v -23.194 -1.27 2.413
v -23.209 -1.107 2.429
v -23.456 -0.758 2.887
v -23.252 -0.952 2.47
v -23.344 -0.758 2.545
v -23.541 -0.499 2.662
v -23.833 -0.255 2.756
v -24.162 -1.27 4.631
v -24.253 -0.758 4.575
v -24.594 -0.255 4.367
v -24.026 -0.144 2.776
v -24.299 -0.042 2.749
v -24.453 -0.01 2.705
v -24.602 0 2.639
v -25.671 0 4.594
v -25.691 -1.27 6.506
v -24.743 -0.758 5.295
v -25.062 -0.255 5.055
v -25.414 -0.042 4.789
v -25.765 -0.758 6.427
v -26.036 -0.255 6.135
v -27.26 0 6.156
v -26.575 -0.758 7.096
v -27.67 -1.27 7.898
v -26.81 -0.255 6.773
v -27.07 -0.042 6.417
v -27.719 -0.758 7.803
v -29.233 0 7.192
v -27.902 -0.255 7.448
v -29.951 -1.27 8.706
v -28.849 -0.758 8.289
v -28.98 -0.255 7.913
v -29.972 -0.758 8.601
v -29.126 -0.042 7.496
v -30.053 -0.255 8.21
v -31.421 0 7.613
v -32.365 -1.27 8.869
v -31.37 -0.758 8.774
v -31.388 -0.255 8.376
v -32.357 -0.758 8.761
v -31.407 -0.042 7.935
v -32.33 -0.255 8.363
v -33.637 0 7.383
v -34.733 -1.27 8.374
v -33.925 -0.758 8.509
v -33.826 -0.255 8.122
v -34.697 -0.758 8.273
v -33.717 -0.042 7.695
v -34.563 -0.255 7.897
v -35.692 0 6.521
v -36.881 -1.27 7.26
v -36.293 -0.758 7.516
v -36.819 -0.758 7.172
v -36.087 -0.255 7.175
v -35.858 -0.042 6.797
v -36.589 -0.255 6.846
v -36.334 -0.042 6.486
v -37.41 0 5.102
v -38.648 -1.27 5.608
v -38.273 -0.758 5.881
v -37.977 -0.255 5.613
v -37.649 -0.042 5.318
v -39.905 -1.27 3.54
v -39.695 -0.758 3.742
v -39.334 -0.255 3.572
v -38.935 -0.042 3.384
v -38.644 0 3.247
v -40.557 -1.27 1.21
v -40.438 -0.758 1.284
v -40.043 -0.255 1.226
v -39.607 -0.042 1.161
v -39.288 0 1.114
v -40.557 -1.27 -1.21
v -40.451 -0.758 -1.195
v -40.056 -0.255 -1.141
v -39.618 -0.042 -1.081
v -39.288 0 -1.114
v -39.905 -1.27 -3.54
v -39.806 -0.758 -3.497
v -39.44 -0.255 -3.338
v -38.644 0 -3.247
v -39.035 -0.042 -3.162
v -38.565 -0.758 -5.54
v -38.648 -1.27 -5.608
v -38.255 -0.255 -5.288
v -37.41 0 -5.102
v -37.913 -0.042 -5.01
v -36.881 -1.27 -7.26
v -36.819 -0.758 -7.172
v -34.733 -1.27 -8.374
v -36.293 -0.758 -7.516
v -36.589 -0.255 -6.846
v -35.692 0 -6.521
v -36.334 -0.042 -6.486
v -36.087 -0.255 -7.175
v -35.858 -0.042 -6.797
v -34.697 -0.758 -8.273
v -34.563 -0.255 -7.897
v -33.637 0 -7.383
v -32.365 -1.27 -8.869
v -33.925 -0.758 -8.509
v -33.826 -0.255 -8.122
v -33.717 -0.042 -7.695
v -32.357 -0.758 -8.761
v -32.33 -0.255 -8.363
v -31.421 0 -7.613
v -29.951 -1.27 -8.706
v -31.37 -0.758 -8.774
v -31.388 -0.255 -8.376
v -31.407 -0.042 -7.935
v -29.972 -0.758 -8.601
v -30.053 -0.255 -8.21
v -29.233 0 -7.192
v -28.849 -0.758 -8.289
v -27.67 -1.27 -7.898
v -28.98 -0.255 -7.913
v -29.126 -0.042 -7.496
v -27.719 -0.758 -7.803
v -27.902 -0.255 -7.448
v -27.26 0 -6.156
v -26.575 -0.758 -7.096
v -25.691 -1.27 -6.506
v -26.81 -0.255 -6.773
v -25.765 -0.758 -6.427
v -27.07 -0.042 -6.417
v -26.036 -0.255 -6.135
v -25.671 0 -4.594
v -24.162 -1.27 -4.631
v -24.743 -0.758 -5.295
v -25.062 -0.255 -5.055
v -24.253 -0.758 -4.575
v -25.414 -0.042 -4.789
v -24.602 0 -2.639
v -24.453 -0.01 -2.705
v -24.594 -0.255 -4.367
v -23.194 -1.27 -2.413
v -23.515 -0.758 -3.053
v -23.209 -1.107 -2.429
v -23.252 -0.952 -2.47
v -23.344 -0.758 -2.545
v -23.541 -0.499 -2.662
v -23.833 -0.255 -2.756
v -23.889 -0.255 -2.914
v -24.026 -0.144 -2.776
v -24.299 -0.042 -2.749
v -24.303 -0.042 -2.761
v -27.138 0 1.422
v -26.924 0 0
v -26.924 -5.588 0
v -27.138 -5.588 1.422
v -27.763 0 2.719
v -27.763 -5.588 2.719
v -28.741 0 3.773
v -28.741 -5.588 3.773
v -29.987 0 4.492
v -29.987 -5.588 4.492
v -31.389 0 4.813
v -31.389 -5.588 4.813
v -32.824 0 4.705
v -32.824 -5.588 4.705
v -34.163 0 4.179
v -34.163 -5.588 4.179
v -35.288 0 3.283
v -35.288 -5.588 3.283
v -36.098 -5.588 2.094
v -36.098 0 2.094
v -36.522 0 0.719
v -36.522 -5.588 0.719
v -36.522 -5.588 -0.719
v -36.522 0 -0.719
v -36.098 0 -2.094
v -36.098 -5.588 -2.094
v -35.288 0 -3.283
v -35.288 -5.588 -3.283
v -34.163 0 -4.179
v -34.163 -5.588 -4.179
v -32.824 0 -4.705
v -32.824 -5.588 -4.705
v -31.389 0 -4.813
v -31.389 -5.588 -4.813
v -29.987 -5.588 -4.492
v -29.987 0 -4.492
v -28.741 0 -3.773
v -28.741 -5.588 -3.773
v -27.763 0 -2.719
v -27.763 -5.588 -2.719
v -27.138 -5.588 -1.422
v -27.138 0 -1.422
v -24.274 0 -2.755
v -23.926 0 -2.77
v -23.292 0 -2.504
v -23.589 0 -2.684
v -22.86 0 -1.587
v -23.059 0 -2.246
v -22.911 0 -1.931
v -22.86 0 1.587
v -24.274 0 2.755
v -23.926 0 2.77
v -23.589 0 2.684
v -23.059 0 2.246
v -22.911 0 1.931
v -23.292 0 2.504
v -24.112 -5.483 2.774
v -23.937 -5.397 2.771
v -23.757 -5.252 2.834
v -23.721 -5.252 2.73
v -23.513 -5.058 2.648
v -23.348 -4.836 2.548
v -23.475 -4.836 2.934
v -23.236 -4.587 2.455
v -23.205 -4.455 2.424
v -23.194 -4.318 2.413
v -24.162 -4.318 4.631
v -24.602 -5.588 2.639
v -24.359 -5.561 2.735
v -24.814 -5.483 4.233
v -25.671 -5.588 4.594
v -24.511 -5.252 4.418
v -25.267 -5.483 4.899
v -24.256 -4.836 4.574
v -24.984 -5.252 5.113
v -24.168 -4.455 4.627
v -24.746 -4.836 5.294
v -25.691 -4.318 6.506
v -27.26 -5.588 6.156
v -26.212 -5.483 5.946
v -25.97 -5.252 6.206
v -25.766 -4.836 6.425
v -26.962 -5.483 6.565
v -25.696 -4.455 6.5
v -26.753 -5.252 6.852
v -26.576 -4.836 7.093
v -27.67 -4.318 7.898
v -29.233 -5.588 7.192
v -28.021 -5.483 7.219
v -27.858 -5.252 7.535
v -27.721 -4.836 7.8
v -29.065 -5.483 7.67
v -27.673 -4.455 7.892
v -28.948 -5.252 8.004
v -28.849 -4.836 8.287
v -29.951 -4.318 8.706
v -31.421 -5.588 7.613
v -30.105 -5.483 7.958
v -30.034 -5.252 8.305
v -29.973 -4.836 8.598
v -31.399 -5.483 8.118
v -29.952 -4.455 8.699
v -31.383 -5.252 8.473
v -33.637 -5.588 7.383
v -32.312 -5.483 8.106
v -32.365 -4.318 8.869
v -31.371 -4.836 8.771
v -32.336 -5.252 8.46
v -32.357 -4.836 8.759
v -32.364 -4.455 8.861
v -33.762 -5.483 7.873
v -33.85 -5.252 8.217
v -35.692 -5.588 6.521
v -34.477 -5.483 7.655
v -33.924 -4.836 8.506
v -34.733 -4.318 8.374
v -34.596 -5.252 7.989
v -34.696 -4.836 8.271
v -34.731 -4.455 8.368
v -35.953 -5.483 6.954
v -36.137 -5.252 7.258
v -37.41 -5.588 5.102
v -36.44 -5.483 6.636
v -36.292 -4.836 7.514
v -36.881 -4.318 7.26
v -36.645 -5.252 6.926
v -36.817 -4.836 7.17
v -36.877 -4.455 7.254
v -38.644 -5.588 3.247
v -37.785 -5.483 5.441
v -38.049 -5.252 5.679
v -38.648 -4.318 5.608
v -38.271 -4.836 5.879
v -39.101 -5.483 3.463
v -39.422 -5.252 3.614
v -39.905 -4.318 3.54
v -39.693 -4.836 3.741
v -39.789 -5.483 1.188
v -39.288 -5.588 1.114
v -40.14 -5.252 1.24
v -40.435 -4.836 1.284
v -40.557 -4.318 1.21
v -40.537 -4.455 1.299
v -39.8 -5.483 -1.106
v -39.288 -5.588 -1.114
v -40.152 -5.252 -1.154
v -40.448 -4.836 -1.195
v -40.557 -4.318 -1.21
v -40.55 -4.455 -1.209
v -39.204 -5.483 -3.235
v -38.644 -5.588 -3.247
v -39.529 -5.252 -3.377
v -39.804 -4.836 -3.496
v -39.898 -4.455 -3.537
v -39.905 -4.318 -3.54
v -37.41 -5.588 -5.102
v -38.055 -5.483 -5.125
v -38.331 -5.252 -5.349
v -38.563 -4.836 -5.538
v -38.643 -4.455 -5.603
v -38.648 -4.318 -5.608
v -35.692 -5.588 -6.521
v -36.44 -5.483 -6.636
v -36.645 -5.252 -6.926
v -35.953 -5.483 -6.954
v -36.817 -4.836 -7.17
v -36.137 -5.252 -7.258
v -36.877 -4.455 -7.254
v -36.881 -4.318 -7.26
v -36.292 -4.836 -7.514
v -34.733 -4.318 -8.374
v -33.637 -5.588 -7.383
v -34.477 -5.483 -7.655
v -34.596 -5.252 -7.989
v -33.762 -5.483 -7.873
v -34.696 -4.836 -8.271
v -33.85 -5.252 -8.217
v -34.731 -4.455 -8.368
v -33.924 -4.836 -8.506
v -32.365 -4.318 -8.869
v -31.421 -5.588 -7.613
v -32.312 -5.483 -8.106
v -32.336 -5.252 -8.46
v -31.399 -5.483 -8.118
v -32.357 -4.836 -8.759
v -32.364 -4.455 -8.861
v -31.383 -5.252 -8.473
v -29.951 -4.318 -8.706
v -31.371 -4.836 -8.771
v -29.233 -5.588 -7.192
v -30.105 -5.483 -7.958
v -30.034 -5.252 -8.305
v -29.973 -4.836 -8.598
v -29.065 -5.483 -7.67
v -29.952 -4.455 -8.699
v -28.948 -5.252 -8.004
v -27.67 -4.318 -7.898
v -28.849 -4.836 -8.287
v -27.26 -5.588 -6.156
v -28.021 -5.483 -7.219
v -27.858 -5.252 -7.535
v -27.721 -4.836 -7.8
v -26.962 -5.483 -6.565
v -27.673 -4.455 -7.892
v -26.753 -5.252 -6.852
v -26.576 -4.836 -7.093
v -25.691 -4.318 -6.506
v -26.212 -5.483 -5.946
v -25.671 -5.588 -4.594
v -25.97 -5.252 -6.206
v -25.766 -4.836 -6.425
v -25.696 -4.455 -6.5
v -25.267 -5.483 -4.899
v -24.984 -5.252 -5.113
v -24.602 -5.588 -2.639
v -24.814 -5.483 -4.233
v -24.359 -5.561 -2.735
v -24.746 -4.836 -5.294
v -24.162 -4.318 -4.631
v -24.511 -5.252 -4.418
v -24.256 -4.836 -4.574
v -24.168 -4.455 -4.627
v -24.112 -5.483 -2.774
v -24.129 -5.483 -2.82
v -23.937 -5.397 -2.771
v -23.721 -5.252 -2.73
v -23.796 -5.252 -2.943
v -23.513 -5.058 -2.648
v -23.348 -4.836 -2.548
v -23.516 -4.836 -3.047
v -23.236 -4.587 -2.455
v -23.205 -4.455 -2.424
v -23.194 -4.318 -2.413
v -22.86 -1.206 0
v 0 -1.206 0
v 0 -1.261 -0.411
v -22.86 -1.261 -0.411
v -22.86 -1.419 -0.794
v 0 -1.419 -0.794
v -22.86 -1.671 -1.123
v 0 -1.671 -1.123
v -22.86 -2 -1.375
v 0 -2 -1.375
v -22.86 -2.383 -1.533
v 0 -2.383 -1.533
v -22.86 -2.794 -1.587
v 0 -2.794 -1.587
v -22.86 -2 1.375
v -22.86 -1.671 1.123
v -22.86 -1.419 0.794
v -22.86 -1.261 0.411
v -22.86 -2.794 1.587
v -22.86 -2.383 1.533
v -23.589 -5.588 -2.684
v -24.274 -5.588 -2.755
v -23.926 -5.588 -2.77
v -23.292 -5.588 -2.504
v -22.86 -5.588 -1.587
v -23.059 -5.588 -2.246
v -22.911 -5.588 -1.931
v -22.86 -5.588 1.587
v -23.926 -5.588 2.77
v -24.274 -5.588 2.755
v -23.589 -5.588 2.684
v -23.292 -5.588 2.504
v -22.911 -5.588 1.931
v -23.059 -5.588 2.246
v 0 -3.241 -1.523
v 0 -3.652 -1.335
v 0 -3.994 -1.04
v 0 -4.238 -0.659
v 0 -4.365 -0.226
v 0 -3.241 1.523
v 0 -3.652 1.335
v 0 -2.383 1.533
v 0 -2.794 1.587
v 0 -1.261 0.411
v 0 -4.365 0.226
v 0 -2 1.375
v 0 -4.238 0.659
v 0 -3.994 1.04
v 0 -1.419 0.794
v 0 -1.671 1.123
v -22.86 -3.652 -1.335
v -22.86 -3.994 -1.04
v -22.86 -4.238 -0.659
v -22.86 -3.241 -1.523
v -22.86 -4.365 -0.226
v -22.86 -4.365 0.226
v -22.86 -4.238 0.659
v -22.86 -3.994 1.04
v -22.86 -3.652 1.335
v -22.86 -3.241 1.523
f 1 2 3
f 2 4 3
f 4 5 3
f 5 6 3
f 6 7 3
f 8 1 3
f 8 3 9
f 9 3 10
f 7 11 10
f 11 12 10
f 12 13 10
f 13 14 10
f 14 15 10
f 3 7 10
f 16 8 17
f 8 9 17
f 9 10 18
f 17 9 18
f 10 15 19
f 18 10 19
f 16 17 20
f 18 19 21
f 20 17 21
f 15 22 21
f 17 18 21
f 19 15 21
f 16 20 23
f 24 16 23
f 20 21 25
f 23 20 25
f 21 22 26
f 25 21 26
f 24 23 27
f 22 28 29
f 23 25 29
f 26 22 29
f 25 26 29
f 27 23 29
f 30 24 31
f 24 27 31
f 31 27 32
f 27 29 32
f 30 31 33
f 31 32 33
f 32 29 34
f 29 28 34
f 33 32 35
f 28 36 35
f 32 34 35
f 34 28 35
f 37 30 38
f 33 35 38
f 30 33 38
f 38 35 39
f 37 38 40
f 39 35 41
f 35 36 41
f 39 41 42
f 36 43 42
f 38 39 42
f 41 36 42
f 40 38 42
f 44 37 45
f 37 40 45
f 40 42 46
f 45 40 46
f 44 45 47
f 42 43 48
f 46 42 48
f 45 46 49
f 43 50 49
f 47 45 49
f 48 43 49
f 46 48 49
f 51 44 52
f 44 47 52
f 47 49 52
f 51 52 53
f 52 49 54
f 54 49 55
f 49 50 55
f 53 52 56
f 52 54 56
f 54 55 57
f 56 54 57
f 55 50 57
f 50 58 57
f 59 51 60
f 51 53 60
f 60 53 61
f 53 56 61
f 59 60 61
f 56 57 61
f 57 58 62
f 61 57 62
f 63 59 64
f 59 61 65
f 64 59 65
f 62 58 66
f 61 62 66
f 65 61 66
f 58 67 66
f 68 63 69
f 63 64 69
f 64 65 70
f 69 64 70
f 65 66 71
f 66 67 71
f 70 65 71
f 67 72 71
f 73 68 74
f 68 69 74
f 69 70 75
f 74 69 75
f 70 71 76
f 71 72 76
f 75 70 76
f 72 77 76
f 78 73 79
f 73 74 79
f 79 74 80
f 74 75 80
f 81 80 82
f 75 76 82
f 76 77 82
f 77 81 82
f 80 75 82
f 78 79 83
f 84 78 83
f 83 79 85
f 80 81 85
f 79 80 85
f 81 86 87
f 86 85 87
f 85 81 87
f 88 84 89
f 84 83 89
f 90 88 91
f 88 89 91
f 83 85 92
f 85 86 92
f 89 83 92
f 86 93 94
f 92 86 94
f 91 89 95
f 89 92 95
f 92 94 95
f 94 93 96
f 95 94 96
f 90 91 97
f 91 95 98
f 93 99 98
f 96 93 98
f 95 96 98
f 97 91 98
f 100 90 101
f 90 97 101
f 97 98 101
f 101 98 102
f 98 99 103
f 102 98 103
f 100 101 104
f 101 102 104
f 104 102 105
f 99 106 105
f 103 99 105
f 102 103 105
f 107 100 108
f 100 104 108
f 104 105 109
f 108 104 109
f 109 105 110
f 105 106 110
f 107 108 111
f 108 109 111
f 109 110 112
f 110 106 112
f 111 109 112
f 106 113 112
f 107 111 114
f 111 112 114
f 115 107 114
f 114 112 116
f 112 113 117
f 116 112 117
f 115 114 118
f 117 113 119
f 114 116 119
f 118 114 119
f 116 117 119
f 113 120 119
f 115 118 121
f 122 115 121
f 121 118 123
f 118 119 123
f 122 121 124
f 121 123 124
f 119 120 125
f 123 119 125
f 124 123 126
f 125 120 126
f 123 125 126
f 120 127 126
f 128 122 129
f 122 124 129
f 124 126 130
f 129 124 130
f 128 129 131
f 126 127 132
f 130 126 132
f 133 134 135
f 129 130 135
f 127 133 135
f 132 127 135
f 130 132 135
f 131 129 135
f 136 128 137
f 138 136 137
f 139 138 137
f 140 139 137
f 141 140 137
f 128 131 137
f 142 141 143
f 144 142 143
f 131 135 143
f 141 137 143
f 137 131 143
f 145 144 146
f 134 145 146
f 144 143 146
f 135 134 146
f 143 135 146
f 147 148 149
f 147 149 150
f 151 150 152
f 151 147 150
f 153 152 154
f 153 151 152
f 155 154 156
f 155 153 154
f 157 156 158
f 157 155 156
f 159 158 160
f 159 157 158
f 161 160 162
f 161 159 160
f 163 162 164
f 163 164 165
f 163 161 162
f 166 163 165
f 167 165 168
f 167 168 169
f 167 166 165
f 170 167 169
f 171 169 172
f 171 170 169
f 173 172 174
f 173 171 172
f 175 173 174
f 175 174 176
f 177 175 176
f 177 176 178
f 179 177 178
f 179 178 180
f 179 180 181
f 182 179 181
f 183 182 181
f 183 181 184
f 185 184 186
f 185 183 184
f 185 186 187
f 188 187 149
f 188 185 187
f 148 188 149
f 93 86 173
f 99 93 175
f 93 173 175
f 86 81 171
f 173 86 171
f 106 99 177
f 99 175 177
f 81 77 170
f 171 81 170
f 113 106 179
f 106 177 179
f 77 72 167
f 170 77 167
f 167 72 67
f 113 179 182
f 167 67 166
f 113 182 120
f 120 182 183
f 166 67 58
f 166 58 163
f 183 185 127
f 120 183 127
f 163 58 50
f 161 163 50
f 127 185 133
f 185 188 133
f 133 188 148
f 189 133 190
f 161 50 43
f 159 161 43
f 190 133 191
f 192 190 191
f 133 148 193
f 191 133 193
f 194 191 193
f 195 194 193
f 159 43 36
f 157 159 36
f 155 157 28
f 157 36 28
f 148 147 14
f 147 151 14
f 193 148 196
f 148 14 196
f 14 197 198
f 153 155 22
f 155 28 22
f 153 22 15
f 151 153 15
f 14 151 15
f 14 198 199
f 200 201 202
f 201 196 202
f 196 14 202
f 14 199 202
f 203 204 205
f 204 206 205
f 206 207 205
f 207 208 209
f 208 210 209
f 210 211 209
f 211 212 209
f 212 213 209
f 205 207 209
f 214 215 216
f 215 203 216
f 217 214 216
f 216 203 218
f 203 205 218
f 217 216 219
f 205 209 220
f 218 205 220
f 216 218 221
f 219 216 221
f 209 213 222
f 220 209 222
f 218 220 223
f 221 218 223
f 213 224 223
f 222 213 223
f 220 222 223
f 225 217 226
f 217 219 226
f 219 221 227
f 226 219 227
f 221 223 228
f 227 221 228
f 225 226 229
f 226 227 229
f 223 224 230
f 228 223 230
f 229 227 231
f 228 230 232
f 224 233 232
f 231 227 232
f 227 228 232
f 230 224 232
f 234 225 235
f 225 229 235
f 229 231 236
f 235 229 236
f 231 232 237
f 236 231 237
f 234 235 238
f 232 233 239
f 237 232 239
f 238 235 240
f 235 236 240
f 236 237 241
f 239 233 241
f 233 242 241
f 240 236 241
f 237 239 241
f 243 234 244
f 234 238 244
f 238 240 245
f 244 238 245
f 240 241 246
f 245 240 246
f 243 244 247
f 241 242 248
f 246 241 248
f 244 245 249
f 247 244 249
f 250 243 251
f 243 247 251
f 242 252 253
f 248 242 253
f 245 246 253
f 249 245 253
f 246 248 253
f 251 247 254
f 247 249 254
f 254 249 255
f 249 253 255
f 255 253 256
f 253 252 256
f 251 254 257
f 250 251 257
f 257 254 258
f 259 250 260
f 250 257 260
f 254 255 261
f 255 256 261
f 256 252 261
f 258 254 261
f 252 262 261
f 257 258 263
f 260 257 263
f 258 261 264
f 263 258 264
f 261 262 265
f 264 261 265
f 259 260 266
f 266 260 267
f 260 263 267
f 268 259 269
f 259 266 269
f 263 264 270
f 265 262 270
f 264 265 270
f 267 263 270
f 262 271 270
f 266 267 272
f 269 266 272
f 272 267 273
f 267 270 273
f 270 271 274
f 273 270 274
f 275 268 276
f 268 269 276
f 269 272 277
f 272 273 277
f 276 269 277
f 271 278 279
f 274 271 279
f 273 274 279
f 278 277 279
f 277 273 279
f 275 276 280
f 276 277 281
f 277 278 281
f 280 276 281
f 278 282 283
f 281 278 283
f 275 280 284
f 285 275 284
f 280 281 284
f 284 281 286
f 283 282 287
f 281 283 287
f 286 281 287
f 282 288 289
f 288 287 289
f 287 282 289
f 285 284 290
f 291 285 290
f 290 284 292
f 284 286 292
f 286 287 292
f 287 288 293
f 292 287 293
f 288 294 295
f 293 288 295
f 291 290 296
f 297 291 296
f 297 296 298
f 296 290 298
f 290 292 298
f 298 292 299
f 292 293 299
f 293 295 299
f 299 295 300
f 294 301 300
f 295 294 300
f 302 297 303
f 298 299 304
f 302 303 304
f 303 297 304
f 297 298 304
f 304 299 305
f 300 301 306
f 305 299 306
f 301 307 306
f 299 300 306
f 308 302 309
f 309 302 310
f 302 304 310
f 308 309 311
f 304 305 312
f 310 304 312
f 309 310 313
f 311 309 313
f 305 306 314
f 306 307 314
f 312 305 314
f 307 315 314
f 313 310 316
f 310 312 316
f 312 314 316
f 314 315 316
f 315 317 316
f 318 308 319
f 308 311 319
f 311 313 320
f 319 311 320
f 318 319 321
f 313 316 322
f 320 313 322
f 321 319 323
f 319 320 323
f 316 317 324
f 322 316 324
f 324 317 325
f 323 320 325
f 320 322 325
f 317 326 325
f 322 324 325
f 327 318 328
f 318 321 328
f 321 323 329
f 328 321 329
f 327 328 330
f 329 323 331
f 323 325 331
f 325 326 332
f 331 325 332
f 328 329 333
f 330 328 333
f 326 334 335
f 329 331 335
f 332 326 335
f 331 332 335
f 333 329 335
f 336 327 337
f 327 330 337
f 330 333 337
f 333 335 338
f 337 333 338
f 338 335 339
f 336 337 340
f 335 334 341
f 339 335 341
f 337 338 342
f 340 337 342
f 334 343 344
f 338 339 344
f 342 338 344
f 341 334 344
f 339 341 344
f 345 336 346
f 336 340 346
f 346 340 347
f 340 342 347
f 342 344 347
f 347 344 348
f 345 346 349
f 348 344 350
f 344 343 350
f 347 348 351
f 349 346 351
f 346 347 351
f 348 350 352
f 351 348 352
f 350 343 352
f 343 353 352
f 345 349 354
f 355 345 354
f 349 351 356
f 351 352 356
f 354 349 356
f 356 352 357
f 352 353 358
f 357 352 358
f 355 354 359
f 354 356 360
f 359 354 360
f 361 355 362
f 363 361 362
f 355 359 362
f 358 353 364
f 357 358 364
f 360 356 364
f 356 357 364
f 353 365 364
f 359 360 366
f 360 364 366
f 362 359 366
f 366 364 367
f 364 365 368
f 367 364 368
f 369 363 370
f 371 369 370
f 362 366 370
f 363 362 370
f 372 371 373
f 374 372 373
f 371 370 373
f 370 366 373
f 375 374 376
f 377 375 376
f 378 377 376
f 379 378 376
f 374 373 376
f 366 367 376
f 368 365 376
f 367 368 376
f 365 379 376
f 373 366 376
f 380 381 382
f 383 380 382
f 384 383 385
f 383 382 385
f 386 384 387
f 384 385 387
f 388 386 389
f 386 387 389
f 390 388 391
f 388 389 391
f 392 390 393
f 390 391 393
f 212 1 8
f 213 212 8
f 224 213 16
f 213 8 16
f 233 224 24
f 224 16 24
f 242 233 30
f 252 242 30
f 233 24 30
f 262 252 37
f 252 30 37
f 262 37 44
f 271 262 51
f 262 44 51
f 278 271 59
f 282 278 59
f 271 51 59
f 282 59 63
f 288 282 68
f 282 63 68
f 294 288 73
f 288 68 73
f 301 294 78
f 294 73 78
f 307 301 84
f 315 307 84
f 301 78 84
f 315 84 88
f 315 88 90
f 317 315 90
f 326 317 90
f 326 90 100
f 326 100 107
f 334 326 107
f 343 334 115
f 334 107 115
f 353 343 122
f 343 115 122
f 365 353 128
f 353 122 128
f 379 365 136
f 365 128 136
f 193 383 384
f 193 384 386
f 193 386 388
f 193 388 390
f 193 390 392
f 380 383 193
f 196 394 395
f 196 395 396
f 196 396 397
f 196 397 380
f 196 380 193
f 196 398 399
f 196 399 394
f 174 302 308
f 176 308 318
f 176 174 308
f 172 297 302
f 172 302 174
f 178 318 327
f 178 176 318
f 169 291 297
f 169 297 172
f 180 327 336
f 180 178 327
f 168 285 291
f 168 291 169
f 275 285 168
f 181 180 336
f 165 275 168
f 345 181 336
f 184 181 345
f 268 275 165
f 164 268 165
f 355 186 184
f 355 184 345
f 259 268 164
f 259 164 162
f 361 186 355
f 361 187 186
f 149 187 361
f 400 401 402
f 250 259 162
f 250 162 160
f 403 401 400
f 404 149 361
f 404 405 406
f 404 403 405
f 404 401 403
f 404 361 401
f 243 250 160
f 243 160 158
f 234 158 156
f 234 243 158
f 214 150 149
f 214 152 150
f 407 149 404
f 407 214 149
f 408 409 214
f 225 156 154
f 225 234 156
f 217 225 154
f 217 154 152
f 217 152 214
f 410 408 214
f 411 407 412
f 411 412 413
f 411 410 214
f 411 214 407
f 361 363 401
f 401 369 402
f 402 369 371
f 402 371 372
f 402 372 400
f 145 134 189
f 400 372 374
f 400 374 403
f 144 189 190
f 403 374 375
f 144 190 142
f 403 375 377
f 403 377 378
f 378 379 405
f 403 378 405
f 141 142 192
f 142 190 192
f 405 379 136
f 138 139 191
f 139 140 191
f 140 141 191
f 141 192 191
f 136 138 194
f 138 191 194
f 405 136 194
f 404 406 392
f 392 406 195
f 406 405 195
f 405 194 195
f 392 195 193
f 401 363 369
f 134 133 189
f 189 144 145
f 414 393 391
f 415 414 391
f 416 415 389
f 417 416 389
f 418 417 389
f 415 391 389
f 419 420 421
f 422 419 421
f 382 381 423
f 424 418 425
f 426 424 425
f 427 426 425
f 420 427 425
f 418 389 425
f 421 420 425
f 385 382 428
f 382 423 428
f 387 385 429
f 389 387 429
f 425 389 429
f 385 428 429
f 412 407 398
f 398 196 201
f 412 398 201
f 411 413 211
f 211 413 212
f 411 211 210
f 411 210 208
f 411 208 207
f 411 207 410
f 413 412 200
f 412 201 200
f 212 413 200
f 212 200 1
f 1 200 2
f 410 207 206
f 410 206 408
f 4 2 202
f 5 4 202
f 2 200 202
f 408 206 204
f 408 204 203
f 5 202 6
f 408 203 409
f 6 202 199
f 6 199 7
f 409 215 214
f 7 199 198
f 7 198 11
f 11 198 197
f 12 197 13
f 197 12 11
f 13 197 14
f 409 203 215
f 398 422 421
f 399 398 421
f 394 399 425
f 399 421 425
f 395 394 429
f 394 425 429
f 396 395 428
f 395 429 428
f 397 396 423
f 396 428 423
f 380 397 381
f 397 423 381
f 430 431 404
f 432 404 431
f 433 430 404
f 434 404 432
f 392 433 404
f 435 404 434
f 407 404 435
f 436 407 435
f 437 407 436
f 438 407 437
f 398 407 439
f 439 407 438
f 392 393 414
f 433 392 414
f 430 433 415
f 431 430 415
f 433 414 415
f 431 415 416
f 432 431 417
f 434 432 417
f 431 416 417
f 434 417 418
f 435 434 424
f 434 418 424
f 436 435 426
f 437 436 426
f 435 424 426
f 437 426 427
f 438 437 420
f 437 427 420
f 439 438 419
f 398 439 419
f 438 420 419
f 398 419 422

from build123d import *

# Parameters (mm, degrees)
F0_R     = 4.826
F1_DEPTH = 5.588
F3_DEPTH = 22.86
F4_R     = 1.27
F5_R     = 1.27


# Not quite as in the source:
# - a feature names something its author has since deleted; it is built from what else it names


with BuildPart() as f1:
    # F0 (on Front) → F1 (new body)
    with BuildSketch(Plane.XZ):
        with BuildLine():
            Line((-22.86, -1.5875), (-22.86, 1.5875))
            ThreePointArc((-22.86, 1.5875), (-22.9466228701, 2.0329296457), (-23.1938651263, 2.4134324153))
            ThreePointArc((-23.1938651263, 2.4134324153), (-40.64, 0), (-23.1938651263, -2.4134324153))
            ThreePointArc((-23.1938651263, -2.4134324153), (-22.9466228701, -2.0329296457), (-22.86, -1.5875))
        make_face()
        with Locations((-31.75, 0)):
            Circle(F0_R, mode=Mode.SUBTRACT)
        Polygon((0, -1.5875), (0, 0), (0, 1.5875), (-22.86, 1.5875), (-22.86, -1.5875), align=None)
    extrude(amount=F1_DEPTH)

    # F2 (on face) → F3 (cut, through all)
    with BuildSketch(Plane.YZ):
        with BuildLine():
            ThreePointArc((-2.794, -1.5875), (-4.3815, 0), (-2.794, 1.5875))
            Line((-2.794, 1.5875), (-5.588, 1.5875))
            Line((-5.588, 1.5875), (-5.588, -1.5875))
            Line((-5.588, -1.5875), (-2.794, -1.5875))
        make_face()
        with BuildLine():
            ThreePointArc((-2.794, 1.5875), (-1.6714679849, 1.1225320151), (-1.2065, 0))
            ThreePointArc((-1.2065, 0), (-1.6714679849, -1.1225320151), (-2.794, -1.5875))
            Line((-2.794, -1.5875), (0, -1.5875))
            Line((0, -1.5875), (0, 1.5875))
            Line((0, 1.5875), (-2.794, 1.5875))
        make_face()
    extrude(amount=-F3_DEPTH, mode=Mode.SUBTRACT)

    # F4
    f4_edges = [f1.edges().sort_by_distance(p)[0] for p in [
        (-40.64, 0, 0),
    ]]
    fillet(f4_edges, radius=F4_R)

    # F5
    f5_edges = [f1.edges().sort_by_distance(p)[0] for p in [
        (-40.64, -5.588, 0),
    ]]
    fillet(f5_edges, radius=F5_R)


solid = f1.part
